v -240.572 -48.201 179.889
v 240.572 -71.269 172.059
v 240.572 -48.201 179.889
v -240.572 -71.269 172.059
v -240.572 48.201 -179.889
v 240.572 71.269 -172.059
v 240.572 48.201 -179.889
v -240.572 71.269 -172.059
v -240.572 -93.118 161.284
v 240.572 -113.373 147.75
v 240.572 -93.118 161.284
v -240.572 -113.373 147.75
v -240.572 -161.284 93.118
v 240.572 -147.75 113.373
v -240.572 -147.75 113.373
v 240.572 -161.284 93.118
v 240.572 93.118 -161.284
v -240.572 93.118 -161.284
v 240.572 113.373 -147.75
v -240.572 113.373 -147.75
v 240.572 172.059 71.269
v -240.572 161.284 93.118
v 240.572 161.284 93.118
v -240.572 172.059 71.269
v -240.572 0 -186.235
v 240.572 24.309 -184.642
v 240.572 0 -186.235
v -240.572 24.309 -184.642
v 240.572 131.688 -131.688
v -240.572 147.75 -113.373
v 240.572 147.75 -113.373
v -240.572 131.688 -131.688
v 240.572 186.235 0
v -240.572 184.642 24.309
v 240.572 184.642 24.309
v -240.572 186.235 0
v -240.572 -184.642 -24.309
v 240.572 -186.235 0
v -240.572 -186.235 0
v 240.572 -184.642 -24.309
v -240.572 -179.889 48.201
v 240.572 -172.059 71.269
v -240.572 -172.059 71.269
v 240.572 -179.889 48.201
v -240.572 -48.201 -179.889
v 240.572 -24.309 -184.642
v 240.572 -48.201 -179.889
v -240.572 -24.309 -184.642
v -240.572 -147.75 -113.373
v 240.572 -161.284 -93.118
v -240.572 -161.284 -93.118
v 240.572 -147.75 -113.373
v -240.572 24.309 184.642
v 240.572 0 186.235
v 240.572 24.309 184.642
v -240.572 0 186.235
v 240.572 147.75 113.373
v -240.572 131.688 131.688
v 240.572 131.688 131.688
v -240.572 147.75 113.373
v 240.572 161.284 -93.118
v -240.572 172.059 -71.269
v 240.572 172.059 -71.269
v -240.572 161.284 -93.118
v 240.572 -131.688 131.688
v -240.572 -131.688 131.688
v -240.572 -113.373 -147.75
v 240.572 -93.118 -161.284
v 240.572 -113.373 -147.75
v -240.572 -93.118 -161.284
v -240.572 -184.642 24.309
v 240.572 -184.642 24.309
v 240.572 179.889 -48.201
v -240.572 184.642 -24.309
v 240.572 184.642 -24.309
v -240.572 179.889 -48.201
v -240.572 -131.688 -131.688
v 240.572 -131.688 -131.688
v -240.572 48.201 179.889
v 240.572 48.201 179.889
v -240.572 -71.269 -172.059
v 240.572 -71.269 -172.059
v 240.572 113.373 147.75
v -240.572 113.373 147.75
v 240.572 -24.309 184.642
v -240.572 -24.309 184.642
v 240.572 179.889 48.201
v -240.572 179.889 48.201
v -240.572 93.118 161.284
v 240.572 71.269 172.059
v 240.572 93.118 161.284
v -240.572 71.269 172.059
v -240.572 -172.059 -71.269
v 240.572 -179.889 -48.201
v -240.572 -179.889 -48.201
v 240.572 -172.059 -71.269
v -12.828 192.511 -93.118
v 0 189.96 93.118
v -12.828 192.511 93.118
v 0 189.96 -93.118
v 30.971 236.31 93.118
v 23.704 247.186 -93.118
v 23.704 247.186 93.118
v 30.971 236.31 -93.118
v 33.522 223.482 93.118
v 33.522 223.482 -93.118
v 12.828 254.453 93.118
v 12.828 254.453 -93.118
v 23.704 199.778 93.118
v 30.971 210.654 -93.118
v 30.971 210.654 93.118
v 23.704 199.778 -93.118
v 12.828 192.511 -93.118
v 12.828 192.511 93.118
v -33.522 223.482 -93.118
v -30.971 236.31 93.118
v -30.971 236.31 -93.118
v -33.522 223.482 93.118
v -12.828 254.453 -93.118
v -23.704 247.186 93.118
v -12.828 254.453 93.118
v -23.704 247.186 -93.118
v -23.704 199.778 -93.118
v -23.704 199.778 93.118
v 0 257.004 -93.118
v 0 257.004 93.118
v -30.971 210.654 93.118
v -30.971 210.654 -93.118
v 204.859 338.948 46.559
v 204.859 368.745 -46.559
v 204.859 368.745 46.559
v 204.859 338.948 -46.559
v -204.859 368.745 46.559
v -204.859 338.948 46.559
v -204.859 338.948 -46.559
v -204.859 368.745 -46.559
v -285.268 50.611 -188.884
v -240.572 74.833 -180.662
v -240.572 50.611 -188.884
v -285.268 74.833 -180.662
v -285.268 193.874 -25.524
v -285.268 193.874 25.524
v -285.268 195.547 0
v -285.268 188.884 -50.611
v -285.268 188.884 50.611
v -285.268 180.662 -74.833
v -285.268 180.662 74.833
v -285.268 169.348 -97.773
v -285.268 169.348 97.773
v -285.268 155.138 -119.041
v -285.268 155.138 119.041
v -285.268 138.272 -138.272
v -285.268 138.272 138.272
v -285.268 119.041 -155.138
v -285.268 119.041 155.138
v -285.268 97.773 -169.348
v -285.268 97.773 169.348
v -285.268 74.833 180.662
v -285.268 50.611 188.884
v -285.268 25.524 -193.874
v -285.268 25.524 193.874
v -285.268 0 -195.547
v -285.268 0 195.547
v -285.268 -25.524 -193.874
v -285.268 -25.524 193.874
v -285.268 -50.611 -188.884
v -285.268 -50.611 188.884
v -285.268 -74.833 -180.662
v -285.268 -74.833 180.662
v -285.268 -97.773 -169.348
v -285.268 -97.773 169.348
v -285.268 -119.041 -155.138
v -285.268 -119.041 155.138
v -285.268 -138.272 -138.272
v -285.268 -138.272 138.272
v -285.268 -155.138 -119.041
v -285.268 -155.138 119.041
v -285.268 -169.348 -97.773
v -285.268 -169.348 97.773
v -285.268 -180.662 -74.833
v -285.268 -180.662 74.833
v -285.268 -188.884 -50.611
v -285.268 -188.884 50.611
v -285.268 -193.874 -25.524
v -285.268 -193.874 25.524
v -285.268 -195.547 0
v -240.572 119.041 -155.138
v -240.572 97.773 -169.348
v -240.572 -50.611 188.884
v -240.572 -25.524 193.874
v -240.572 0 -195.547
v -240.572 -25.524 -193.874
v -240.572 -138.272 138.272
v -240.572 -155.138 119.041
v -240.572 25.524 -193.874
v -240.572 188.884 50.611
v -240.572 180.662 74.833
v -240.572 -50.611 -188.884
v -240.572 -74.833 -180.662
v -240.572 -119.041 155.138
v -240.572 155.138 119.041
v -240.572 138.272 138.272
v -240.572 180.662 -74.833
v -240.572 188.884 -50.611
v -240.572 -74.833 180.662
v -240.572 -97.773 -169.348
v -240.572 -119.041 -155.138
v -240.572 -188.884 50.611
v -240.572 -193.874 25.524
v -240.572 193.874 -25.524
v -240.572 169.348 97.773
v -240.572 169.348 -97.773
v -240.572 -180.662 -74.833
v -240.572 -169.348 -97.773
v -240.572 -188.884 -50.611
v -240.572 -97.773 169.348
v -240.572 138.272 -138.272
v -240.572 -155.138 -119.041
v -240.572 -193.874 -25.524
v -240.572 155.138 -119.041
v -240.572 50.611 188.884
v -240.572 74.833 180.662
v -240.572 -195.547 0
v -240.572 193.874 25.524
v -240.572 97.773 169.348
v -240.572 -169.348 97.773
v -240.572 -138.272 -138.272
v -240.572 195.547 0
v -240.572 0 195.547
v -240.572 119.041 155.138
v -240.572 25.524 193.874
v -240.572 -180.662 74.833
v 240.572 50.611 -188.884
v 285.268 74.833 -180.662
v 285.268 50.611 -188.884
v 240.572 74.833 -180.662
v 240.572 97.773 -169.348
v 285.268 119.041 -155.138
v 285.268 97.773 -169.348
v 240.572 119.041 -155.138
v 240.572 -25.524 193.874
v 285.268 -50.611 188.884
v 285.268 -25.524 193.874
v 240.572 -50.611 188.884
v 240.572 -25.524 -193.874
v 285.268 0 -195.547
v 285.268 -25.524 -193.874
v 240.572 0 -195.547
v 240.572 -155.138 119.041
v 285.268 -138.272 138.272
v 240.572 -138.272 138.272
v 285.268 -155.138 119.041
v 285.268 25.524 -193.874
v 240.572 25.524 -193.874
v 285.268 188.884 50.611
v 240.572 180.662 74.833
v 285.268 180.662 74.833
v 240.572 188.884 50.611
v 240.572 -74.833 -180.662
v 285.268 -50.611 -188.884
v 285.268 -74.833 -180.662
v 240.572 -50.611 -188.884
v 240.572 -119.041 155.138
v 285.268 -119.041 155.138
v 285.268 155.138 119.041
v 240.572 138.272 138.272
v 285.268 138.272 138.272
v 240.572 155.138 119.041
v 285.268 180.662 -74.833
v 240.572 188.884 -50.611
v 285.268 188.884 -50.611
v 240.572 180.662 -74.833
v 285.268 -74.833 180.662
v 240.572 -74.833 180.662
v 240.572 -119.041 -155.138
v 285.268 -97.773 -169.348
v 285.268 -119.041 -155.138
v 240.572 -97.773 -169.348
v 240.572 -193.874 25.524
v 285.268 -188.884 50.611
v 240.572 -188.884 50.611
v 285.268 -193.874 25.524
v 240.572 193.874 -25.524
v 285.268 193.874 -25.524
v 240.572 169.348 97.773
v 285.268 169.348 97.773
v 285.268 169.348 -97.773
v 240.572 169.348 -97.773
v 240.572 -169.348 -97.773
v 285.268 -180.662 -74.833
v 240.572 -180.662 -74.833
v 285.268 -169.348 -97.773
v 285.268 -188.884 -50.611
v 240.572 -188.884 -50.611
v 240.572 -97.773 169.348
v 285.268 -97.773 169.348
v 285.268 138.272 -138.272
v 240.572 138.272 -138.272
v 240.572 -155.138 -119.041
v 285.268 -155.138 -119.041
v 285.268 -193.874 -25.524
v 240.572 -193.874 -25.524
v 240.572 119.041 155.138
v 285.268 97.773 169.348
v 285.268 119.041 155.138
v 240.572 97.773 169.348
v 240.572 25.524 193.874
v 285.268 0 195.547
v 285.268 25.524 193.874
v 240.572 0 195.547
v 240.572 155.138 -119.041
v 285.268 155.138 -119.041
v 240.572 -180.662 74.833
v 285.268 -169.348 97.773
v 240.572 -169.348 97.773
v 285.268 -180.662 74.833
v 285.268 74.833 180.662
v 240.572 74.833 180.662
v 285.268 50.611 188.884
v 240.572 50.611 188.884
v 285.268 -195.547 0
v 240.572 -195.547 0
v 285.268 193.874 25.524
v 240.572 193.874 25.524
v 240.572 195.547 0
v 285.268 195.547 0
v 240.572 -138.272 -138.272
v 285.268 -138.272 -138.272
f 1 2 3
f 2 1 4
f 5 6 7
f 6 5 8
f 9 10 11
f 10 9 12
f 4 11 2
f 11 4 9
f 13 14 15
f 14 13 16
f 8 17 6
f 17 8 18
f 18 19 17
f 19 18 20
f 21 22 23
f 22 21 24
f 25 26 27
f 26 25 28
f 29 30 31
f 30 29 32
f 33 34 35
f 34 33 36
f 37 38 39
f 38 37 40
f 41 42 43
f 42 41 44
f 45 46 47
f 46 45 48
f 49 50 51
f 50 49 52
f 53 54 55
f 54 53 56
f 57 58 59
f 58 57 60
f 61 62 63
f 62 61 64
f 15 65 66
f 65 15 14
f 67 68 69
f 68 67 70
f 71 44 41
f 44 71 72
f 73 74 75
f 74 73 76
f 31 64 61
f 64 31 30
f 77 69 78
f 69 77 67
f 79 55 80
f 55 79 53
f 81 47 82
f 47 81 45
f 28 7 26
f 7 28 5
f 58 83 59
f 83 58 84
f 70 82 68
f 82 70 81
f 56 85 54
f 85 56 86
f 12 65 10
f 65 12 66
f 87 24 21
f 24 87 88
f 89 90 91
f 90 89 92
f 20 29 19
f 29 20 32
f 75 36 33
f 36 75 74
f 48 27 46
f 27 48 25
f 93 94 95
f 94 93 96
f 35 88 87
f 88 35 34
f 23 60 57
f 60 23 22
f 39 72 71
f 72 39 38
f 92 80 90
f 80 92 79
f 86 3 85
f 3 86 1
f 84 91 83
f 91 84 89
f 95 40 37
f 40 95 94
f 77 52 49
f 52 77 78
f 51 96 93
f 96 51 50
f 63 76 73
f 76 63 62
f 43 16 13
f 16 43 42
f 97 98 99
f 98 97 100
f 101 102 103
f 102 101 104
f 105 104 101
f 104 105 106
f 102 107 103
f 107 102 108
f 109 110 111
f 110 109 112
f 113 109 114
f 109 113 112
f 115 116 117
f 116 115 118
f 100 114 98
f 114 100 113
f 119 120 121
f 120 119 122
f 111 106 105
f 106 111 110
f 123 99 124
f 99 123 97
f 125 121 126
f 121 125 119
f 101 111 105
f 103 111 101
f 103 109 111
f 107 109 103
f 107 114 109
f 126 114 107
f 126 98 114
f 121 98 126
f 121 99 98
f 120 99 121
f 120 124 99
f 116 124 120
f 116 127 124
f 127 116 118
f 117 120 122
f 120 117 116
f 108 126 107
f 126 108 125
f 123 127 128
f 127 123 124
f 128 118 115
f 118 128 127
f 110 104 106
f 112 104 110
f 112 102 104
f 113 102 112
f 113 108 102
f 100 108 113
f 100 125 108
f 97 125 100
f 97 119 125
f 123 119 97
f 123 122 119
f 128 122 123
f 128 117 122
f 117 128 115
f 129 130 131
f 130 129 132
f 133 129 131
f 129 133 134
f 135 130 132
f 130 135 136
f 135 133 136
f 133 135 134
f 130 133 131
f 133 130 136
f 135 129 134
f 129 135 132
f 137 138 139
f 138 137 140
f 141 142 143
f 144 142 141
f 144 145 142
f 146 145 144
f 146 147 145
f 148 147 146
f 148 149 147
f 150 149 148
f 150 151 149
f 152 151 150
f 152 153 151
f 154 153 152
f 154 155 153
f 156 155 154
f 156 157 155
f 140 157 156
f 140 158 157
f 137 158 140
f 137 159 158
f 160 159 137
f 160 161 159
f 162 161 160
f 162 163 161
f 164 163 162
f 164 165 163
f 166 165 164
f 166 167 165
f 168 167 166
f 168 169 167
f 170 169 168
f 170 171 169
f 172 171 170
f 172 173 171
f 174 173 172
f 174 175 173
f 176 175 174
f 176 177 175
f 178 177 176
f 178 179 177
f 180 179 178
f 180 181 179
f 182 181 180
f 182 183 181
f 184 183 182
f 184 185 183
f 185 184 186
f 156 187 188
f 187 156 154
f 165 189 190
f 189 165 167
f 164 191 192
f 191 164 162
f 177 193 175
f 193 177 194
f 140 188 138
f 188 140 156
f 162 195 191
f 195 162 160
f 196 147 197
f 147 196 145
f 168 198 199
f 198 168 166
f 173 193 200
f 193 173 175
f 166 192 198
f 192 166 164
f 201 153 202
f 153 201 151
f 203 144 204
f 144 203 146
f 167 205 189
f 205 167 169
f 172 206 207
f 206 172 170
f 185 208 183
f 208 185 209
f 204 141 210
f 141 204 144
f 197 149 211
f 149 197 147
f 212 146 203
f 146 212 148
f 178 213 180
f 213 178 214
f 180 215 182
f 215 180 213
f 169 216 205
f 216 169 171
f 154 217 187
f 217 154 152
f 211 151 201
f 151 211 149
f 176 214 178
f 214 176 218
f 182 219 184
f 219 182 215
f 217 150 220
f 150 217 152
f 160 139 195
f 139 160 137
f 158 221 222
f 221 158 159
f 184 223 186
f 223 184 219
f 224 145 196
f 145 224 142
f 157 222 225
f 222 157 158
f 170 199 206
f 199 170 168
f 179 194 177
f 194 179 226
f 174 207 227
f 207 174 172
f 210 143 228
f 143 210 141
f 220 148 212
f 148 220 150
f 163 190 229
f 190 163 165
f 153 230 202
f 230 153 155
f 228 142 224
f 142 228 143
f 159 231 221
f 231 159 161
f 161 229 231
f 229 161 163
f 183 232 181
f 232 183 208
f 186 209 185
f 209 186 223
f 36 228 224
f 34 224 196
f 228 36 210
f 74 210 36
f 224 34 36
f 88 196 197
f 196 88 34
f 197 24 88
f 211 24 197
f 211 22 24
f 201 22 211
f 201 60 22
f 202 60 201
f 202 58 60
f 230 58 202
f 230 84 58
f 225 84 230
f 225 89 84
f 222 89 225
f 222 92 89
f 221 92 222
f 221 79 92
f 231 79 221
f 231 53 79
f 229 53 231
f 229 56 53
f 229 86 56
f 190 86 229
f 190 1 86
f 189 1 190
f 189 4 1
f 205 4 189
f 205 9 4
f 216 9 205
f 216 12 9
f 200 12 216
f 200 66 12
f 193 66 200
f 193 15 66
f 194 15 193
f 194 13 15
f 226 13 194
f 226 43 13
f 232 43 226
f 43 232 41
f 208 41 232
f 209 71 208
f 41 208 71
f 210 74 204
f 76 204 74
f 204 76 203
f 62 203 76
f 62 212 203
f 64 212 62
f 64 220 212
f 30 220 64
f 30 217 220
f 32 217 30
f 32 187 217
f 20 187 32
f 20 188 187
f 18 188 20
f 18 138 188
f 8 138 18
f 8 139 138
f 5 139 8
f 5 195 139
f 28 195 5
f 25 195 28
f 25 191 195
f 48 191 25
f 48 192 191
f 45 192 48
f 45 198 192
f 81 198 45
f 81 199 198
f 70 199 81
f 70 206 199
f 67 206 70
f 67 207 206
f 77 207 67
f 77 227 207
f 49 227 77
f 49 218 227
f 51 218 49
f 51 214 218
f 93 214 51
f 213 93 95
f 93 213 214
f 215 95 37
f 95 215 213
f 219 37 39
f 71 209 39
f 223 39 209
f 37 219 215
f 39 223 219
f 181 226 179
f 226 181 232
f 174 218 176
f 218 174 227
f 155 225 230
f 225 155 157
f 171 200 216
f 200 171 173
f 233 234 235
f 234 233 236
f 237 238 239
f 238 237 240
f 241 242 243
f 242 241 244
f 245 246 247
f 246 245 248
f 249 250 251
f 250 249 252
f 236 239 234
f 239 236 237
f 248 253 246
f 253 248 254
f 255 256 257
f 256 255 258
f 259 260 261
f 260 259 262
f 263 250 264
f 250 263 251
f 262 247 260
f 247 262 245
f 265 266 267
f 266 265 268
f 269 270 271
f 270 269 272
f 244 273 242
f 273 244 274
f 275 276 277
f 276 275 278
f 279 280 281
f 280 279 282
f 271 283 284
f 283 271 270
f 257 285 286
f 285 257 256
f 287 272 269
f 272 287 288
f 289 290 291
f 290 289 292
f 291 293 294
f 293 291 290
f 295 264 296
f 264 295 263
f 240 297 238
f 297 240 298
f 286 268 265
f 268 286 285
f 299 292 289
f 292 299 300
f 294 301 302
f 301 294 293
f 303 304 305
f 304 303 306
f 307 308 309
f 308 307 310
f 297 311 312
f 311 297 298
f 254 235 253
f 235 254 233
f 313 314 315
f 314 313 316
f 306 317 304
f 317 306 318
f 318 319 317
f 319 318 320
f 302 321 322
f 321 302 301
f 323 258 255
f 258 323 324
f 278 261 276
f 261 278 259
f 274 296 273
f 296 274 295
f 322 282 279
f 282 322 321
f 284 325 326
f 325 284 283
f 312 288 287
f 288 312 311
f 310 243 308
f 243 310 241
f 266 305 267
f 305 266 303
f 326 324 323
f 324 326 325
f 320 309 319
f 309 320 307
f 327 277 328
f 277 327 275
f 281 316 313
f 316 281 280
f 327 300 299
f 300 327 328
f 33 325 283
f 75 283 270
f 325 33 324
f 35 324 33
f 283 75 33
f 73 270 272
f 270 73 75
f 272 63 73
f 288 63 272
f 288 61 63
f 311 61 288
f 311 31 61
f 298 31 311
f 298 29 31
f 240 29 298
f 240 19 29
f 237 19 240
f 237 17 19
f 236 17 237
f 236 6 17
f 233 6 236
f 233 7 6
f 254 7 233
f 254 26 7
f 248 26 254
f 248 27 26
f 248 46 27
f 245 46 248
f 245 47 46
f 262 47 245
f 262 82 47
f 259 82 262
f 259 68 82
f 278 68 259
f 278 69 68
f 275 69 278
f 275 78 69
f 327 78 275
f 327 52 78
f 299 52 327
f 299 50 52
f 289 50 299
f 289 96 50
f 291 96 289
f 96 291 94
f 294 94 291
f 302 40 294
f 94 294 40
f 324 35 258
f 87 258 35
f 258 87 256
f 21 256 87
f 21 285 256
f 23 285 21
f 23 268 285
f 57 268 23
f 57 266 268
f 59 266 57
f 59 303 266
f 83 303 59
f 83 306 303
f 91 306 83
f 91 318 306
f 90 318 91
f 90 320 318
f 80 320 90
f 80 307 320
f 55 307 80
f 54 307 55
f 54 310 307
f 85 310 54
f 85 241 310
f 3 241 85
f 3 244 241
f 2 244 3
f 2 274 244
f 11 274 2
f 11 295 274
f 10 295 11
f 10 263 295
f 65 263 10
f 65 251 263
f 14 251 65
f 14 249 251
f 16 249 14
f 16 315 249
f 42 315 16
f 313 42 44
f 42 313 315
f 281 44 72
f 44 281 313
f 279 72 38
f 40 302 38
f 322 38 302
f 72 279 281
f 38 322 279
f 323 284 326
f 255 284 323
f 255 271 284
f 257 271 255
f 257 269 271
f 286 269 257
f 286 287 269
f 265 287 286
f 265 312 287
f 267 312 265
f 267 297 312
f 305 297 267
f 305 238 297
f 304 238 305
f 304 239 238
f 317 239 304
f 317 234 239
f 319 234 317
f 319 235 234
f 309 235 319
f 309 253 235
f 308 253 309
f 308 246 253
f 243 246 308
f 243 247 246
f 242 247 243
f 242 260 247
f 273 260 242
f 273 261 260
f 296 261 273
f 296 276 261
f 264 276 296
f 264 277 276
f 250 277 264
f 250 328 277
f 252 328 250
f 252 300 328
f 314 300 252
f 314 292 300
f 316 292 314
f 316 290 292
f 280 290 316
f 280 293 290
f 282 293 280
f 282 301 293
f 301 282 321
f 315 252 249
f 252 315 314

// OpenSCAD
// Auto-generated by scripts/author_from_manifest.py (Phase D.3).
// Source: data/phase_d_manifest.json (sku_intent='tyco-av1-300-alarm-check-8in').
// Do not hand-edit — regenerate from the manifest.
//
// @part tyco_av1_300_alarm_check_8in
// @kind valve
// @category valve.alarm.check
// @display-name "Tyco AV-1-300 Alarm Check Valve 8\" (300 psi)"
// @mfg tyco_fire_protection
// @mfg-pn AV-1-300
// @listing UL FM
// @price-usd 700.00
// @install-minutes 45
// @crew foreman
// @param size_in number default=8 label="Size" unit="in"
// @port inlet position=[-0.05,0,0] direction=[-1,0,0] style=grooved size_in=8 role=run_a
// @port outlet position=[0.05,0,0] direction=[1,0,0] style=grooved size_in=8 role=run_b

size_in = 8.0;

function od_mm(nps) =
    nps ==   1  ? 33.4 :
    nps == 1.25 ? 42.2 :
    nps == 1.5  ? 48.3 :
    nps ==   2  ? 60.3 :
    nps == 2.5  ? 73.0 :
    nps ==   3  ? 88.9 :
    nps ==   4  ? 114.3 :
    nps ==   6  ? 168.3 :
    nps ==   8  ? 219.1 : 73.0;

od = od_mm(size_in);
body_len = od * 2.4;
body_d   = od * 1.7;

union() {
    // Valve body
    rotate([0, 90, 0])
        cylinder(h = body_len, d = body_d, center = true, $fn = 48);
    // Stem / handle indicator
    translate([0, body_d * 0.6, 0])
        cylinder(h = body_d * 0.5, d = body_d * 0.18, center = true, $fn = 16);
    translate([0, body_d * 0.95, 0])
        cube([body_d * 1.1, body_d * 0.08, body_d * 0.25], center = true);
    // End flanges
    translate([-body_len/2, 0, 0])
        rotate([0, 90, 0])
        cylinder(h = body_d * 0.12, d = body_d * 1.05, center = true, $fn = 48);
    translate([ body_len/2, 0, 0])
        rotate([0, 90, 0])
        cylinder(h = body_d * 0.12, d = body_d * 1.05, center = true, $fn = 48);
}
